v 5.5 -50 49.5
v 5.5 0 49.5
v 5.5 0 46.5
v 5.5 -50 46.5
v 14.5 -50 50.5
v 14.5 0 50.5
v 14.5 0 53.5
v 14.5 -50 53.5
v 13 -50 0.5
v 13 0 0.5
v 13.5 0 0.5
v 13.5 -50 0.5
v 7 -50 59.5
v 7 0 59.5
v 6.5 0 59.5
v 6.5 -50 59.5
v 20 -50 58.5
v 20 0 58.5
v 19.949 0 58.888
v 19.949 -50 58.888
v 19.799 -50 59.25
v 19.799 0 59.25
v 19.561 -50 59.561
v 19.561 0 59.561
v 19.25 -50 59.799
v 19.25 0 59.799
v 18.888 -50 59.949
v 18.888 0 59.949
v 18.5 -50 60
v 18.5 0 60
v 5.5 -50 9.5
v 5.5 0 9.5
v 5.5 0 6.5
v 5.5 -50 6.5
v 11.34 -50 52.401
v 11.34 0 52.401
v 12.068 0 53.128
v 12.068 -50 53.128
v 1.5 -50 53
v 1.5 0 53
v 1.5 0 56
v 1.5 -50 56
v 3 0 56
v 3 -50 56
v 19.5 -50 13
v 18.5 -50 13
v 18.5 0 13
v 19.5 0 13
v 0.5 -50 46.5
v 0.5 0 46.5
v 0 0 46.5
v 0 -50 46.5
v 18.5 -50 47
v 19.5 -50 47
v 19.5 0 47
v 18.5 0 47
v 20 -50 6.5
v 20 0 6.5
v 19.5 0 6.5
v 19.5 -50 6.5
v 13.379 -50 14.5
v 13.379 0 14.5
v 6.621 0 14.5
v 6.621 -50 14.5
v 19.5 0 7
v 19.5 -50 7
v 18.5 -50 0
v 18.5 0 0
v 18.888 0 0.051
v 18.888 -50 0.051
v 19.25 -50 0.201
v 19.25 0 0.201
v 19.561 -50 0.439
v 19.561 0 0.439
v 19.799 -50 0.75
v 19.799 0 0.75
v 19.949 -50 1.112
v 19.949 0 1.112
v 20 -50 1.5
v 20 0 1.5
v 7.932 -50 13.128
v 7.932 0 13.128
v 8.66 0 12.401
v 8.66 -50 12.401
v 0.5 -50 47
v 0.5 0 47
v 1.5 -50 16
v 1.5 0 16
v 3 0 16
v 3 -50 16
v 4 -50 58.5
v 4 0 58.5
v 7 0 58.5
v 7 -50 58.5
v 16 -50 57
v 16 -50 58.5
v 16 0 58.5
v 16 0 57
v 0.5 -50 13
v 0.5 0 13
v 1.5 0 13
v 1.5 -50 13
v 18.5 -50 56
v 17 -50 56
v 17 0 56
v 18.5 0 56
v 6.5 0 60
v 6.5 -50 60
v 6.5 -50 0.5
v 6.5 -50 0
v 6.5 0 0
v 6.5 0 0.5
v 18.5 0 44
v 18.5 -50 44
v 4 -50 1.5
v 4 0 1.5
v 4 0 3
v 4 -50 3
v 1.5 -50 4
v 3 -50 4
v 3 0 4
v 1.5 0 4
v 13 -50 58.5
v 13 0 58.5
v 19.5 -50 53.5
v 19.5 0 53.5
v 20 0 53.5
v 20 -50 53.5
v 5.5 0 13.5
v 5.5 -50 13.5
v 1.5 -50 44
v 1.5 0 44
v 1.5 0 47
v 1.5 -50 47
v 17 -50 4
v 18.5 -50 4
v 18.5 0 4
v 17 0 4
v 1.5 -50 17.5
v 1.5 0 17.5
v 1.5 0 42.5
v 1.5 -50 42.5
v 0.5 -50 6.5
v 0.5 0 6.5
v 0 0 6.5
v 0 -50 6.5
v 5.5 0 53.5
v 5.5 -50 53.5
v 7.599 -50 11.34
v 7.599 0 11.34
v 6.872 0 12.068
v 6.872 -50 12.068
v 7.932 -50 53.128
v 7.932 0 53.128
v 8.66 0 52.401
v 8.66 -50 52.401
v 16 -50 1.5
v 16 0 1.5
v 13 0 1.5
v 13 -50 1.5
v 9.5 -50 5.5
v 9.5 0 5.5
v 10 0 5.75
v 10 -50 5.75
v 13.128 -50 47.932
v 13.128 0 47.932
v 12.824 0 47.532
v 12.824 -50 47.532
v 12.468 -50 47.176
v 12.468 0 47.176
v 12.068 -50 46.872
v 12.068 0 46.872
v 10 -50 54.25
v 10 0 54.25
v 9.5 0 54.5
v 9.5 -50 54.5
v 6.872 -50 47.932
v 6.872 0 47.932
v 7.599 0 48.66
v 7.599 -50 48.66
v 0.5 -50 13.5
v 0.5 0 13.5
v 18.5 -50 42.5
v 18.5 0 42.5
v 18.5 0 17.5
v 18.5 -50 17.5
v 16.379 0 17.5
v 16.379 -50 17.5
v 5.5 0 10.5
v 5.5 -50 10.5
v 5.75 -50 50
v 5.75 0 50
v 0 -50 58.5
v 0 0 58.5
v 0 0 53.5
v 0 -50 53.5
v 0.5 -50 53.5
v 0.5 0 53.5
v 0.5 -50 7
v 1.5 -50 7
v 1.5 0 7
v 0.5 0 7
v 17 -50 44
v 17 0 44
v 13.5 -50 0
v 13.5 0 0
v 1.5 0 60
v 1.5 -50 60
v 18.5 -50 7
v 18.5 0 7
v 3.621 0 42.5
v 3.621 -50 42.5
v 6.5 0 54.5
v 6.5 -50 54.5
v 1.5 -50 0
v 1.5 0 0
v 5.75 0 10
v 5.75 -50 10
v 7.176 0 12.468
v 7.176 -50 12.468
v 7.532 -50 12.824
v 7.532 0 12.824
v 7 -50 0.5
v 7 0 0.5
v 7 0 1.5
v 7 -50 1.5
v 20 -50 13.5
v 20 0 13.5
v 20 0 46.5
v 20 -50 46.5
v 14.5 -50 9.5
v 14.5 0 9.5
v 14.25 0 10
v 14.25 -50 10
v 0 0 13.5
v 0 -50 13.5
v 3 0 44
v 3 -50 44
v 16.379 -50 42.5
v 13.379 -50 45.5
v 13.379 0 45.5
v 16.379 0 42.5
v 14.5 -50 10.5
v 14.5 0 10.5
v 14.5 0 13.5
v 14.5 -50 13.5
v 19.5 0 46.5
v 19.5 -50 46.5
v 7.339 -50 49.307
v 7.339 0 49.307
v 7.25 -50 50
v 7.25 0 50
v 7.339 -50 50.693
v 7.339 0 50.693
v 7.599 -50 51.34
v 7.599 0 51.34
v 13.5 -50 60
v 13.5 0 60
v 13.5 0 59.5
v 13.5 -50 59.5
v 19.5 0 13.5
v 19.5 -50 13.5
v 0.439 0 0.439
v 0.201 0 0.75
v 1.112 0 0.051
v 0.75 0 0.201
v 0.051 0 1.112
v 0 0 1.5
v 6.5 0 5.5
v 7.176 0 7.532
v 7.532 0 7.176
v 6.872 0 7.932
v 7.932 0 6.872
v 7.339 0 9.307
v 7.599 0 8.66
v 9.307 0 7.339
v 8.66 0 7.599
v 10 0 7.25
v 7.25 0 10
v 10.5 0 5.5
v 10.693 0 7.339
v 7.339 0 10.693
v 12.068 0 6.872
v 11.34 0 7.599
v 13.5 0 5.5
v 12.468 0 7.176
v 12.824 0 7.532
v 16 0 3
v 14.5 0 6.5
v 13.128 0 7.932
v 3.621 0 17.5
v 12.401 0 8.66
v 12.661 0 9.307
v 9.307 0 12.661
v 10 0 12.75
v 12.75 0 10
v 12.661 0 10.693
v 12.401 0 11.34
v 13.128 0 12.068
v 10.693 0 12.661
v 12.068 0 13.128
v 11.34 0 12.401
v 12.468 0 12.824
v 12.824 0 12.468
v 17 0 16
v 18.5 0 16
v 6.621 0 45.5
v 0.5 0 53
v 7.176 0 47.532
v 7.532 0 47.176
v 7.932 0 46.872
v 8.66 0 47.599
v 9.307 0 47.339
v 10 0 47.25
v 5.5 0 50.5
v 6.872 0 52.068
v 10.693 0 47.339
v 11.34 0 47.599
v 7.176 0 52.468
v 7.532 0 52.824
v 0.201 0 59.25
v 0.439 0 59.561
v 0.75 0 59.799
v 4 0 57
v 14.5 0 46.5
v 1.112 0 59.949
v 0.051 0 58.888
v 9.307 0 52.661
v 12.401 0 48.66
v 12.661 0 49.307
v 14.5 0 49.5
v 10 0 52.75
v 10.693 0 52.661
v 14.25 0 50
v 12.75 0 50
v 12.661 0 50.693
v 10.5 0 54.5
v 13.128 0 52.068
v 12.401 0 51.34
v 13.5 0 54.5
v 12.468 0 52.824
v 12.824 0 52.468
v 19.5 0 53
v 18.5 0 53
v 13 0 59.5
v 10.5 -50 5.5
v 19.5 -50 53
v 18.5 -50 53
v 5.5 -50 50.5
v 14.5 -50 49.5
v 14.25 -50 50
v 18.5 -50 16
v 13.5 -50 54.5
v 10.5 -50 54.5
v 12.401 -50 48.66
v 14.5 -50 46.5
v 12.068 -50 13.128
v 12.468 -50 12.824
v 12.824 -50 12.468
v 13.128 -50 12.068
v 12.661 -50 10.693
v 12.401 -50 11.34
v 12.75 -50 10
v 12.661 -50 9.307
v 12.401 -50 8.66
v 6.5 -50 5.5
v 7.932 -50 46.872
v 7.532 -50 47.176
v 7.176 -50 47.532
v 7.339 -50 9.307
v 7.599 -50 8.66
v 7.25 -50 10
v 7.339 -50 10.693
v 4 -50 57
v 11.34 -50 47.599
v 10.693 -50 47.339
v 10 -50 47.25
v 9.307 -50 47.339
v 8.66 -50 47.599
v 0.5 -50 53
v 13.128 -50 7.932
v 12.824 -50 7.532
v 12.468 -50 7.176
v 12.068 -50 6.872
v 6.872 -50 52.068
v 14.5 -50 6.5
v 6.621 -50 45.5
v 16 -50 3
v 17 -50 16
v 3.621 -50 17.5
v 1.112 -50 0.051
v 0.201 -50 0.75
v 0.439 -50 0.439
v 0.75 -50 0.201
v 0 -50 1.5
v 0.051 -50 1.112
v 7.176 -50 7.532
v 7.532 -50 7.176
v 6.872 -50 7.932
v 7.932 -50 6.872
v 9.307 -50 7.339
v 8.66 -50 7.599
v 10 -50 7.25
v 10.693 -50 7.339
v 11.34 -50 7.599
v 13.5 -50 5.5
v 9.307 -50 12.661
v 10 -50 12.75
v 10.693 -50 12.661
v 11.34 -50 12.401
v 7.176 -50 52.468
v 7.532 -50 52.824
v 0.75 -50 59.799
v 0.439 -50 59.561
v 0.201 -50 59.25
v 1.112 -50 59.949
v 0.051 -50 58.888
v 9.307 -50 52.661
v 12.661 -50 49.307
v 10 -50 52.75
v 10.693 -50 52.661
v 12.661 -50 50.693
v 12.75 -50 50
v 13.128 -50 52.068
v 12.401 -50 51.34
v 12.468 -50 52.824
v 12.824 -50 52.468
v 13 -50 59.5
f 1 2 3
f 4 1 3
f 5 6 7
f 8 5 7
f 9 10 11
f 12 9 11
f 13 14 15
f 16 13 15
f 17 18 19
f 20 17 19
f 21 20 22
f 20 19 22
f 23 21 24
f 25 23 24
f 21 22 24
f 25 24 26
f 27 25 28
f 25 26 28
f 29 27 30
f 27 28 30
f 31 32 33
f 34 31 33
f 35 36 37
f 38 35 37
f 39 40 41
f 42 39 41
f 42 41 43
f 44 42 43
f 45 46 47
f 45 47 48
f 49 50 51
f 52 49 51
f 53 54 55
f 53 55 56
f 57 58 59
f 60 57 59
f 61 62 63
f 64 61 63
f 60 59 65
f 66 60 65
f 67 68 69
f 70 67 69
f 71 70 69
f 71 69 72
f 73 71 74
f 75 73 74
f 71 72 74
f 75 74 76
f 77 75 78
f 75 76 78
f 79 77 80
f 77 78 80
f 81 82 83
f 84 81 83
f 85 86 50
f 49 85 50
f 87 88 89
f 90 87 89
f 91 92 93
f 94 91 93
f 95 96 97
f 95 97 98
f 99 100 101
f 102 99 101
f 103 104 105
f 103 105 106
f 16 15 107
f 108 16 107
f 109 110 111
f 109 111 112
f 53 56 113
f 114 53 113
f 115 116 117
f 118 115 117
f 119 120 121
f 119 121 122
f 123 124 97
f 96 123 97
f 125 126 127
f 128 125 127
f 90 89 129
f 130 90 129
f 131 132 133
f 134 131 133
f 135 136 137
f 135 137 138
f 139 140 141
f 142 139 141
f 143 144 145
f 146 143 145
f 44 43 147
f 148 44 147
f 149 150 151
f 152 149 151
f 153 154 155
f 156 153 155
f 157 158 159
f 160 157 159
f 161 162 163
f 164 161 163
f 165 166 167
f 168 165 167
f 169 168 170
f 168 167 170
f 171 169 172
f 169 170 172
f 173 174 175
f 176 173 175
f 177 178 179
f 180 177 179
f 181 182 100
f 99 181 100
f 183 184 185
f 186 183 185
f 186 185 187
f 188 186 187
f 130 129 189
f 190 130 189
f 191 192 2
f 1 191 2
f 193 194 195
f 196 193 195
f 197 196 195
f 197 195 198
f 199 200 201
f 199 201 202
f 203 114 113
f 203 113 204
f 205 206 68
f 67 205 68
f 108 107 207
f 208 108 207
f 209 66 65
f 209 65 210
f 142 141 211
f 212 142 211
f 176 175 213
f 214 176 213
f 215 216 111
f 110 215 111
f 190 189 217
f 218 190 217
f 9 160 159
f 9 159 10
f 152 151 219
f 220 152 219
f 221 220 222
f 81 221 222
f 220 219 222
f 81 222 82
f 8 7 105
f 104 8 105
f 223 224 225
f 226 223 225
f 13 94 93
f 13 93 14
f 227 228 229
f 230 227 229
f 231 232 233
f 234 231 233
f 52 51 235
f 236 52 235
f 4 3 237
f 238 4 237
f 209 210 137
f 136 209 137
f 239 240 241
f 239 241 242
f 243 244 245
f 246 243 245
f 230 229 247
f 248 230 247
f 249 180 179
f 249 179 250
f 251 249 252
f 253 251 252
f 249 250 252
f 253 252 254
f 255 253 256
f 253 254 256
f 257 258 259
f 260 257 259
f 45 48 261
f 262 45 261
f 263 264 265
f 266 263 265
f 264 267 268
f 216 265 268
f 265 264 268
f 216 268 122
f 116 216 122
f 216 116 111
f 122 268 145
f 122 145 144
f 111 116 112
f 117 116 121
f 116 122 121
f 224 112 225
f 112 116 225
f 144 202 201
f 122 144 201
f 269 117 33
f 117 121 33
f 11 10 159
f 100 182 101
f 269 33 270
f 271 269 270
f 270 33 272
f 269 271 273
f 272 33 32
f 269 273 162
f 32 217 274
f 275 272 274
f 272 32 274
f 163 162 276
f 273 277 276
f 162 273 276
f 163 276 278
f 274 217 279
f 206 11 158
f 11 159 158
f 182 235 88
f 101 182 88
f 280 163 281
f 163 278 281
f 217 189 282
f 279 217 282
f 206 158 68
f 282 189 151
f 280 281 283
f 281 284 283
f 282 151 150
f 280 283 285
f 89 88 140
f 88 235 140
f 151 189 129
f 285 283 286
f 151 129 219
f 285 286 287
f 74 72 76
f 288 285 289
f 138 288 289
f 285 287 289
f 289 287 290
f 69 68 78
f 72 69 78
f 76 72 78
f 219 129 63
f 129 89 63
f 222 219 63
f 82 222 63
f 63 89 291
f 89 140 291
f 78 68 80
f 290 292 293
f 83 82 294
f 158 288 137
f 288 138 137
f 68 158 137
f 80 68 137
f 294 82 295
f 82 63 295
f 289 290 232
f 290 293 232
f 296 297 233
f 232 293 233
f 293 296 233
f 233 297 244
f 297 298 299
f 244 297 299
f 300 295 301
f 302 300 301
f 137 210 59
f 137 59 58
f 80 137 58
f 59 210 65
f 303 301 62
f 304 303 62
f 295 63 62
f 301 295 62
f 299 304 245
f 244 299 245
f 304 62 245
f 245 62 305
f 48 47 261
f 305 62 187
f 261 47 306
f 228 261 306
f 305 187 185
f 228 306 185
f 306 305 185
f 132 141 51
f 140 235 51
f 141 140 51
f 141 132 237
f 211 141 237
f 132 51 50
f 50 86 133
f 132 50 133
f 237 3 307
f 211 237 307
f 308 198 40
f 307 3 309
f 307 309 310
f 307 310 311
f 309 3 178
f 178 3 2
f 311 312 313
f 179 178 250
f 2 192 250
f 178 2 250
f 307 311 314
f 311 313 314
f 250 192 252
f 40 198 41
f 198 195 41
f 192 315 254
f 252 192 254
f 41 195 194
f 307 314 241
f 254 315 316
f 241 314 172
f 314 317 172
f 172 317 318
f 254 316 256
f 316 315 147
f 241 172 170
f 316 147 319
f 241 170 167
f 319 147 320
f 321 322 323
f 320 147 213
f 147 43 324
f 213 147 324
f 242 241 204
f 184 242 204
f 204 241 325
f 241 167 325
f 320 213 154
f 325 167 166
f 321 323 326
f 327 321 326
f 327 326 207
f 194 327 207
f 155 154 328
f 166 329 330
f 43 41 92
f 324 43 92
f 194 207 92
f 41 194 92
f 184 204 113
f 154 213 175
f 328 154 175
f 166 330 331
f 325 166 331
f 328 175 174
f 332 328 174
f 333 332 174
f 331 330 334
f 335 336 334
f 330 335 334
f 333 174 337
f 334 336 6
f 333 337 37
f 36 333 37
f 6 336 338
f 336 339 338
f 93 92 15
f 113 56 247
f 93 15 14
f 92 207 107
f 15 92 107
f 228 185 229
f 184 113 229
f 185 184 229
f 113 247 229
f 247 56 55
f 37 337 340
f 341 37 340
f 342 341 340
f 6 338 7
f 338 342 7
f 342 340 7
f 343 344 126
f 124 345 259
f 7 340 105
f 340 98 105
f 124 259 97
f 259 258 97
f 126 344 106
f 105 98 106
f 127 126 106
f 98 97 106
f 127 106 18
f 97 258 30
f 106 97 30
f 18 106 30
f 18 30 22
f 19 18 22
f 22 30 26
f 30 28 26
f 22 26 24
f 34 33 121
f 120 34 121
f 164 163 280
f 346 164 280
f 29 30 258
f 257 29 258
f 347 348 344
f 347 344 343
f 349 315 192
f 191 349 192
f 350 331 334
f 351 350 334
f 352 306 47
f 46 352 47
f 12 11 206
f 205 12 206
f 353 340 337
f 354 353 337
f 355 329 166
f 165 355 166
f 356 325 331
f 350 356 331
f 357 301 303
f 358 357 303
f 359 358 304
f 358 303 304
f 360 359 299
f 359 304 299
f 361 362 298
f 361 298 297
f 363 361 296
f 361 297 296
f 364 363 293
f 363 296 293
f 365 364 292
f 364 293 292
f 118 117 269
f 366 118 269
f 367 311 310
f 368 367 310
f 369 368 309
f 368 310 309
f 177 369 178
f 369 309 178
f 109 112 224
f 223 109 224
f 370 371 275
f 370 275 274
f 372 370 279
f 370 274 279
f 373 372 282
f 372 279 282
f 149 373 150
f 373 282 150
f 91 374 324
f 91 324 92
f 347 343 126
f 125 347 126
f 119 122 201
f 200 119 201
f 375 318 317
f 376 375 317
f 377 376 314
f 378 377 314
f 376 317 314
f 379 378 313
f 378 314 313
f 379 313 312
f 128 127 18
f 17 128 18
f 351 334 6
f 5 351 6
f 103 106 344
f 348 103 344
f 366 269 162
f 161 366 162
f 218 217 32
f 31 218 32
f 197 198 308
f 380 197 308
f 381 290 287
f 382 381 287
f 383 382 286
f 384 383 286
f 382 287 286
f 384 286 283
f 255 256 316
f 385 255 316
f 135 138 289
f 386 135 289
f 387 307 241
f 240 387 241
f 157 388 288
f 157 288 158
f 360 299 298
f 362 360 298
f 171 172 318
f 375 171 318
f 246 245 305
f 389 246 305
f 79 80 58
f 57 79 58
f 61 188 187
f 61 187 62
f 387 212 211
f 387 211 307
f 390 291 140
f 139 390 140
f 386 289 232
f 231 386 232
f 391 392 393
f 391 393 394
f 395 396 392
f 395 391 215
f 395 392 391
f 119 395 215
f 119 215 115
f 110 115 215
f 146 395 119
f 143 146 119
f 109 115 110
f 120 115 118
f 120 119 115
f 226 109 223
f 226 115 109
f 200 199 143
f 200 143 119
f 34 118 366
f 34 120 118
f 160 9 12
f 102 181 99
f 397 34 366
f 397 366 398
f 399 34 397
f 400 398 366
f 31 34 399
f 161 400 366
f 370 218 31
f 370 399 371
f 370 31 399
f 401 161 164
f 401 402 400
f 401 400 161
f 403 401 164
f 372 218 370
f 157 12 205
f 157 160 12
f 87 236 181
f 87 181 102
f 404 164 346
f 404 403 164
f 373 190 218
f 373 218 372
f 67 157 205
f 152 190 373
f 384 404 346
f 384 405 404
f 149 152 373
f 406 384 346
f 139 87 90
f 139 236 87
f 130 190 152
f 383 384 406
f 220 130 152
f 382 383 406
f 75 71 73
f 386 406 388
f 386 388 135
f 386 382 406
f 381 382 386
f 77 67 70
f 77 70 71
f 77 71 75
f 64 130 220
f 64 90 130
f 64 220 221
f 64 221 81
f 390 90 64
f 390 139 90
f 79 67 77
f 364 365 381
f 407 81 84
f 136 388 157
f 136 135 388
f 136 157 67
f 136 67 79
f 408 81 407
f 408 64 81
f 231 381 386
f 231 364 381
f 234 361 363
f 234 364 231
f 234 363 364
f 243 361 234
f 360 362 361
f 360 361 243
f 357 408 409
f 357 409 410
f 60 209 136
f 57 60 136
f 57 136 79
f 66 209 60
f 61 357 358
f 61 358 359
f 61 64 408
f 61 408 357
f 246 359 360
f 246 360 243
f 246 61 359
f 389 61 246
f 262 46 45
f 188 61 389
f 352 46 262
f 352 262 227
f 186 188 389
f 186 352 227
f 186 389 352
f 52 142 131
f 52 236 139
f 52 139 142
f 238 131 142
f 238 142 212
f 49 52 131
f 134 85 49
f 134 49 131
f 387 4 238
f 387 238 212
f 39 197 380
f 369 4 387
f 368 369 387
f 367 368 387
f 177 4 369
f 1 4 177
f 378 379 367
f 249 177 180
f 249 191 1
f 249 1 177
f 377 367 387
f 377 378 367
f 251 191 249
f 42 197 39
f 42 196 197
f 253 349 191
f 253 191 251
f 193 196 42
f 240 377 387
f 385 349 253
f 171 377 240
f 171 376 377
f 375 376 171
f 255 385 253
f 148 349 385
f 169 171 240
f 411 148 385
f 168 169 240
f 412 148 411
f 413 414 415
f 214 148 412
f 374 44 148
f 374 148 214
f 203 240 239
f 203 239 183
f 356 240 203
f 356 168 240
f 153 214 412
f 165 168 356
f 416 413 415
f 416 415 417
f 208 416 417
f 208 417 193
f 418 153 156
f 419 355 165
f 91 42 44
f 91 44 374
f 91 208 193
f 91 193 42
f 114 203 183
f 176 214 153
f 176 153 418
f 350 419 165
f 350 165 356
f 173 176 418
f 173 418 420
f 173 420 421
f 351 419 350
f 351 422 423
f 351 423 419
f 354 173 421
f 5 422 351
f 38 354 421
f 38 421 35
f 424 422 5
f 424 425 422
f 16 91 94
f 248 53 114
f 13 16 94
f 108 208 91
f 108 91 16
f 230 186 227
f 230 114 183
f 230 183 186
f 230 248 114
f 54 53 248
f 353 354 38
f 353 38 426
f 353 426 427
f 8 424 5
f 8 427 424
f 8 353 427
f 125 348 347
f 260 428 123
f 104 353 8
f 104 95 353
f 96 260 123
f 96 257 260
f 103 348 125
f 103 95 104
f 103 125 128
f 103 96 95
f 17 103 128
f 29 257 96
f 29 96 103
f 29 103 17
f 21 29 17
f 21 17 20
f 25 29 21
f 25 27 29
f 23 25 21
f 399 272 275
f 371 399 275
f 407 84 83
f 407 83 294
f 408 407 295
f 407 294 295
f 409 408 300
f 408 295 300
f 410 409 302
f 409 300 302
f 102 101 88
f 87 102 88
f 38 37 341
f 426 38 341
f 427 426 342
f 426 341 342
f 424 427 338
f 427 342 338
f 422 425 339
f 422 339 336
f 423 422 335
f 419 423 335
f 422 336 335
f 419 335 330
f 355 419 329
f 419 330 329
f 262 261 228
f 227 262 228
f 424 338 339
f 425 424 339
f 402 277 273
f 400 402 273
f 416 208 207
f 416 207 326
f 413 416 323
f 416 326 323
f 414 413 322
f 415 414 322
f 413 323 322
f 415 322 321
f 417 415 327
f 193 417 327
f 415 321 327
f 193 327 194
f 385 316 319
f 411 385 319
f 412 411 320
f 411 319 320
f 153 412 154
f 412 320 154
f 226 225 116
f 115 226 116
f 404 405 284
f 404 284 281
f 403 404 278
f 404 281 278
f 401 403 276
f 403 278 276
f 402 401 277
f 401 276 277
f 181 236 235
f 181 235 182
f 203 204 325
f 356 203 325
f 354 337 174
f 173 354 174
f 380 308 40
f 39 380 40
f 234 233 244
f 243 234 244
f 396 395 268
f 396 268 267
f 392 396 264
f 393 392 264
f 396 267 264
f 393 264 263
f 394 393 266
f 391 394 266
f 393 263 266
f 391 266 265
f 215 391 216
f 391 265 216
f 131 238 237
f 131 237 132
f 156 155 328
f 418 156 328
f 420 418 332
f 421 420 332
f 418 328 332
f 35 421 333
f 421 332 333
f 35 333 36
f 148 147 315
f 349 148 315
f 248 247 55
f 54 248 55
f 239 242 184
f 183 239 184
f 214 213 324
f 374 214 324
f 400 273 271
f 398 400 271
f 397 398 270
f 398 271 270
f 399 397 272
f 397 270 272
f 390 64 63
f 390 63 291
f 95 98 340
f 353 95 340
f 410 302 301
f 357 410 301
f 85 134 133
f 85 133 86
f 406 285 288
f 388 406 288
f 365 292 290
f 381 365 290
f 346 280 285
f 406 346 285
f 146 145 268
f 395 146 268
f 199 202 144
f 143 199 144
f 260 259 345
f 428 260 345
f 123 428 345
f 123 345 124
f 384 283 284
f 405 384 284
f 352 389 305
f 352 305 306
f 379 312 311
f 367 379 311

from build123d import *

# Parameters (mm, degrees)
F1_DEPTH = 50


with BuildPart() as f1:
    # F0 (on Front) → F1 (new body)
    with BuildSketch(Plane.XZ):
        with BuildLine():
            ThreePointArc((0, 1.5), (0.43934, 0.43934), (1.5, 0))
            Line((1.5, 0), (6.5, 0))
            Line((6.5, 0), (6.5, 0.5))
            Line((6.5, 0.5), (7, 0.5))
            Line((7, 0.5), (7, 1.5))
            Line((7, 1.5), (4, 1.5))
            Line((4, 1.5), (4, 3))
            Line((4, 3), (6.5, 5.5))
            Line((6.5, 5.5), (9.5, 5.5))
            Line((9.5, 5.5), (10, 5.75))
            Line((10, 5.75), (10.5, 5.5))
            Line((10.5, 5.5), (13.5, 5.5))
            Line((13.5, 5.5), (16, 3))
            Line((16, 3), (16, 1.5))
            Line((16, 1.5), (13, 1.5))
            Line((13, 1.5), (13, 0.5))
            Line((13, 0.5), (13.5, 0.5))
            Line((13.5, 0.5), (13.5, 0))
            Line((13.5, 0), (18.5, 0))
            ThreePointArc((18.5, 0), (19.56066, 0.43934), (20, 1.5))
            Line((20, 1.5), (20, 6.5))
            Line((20, 6.5), (19.5, 6.5))
            Line((19.5, 6.5), (19.5, 7))
            Line((19.5, 7), (18.5, 7))
            Line((18.5, 7), (18.5, 4))
            Line((18.5, 4), (17, 4))
            Line((17, 4), (14.5, 6.5))
            Line((14.5, 6.5), (14.5, 9.5))
            Line((14.5, 9.5), (14.25, 10))
            Line((14.25, 10), (14.5, 10.5))
            Line((14.5, 10.5), (14.5, 13.5))
            Line((14.5, 13.5), (17, 16))
            Line((17, 16), (18.5, 16))
            Line((18.5, 16), (18.5, 13))
            Line((18.5, 13), (19.5, 13))
            Line((19.5, 13), (19.5, 13.5))
            Line((19.5, 13.5), (20, 13.5))
            Line((20, 13.5), (20, 46.5))
            Line((20, 46.5), (19.5, 46.5))
            Line((19.5, 46.5), (19.5, 47))
            Line((19.5, 47), (18.5, 47))
            Line((18.5, 47), (18.5, 44))
            Line((18.5, 44), (17, 44))
            Line((17, 44), (14.5, 46.5))
            Line((14.5, 46.5), (14.5, 49.5))
            Line((14.5, 49.5), (14.25, 50))
            Line((14.25, 50), (14.5, 50.5))
            Line((14.5, 50.5), (14.5, 53.5))
            Line((14.5, 53.5), (17, 56))
            Line((17, 56), (18.5, 56))
            Line((18.5, 56), (18.5, 53))
            Line((18.5, 53), (19.5, 53))
            Line((19.5, 53), (19.5, 53.5))
            Line((19.5, 53.5), (20, 53.5))
            Line((20, 53.5), (20, 58.5))
            ThreePointArc((20, 58.5), (19.56066, 59.56066), (18.5, 60))
            Line((18.5, 60), (13.5, 60))
            Line((13.5, 60), (13.5, 59.5))
            Line((13.5, 59.5), (13, 59.5))
            Line((13, 59.5), (13, 58.5))
            Line((13, 58.5), (16, 58.5))
            Line((16, 58.5), (16, 57))
            Line((16, 57), (13.5, 54.5))
            Line((13.5, 54.5), (10.5, 54.5))
            Line((10.5, 54.5), (10, 54.25))
            Line((10, 54.25), (9.5, 54.5))
            Line((9.5, 54.5), (6.5, 54.5))
            Line((6.5, 54.5), (4, 57))
            Line((4, 57), (4, 58.5))
            Line((4, 58.5), (7, 58.5))
            Line((7, 58.5), (7, 59.5))
            Line((7, 59.5), (6.5, 59.5))
            Line((6.5, 59.5), (6.5, 60))
            Line((6.5, 60), (1.5, 60))
            ThreePointArc((1.5, 60), (0.43934, 59.56066), (0, 58.5))
            Line((0, 58.5), (0, 53.5))
            Line((0, 53.5), (0.5, 53.5))
            Line((0.5, 53.5), (0.5, 53))
            Line((0.5, 53), (1.5, 53))
            Line((1.5, 53), (1.5, 56))
            Line((1.5, 56), (3, 56))
            Line((3, 56), (5.5, 53.5))
            Line((5.5, 53.5), (5.5, 50.5))
            Line((5.5, 50.5), (5.75, 50))
            Line((5.75, 50), (5.5, 49.5))
            Line((5.5, 49.5), (5.5, 46.5))
            Line((5.5, 46.5), (3, 44))
            Line((3, 44), (1.5, 44))
            Line((1.5, 44), (1.5, 47))
            Line((1.5, 47), (0.5, 47))
            Line((0.5, 47), (0.5, 46.5))
            Line((0.5, 46.5), (0, 46.5))
            Line((0, 46.5), (0, 13.5))
            Line((0, 13.5), (0.5, 13.5))
            Line((0.5, 13.5), (0.5, 13))
            Line((0.5, 13), (1.5, 13))
            Line((1.5, 13), (1.5, 16))
            Line((1.5, 16), (3, 16))
            Line((3, 16), (5.5, 13.5))
            Line((5.5, 13.5), (5.5, 10.5))
            Line((5.5, 10.5), (5.75, 10))
            Line((5.75, 10), (5.5, 9.5))
            Line((5.5, 9.5), (5.5, 6.5))
            Line((5.5, 6.5), (3, 4))
            Line((3, 4), (1.5, 4))
            Line((1.5, 4), (1.5, 7))
            Line((1.5, 7), (0.5, 7))
            Line((0.5, 7), (0.5, 6.5))
            Line((0.5, 6.5), (0, 6.5))
            Line((0, 6.5), (0, 1.5))
        make_face()
        with BuildLine():
            Line((8.659501, 7.598841), (7.932254, 6.871594))
            ThreePointArc((7.932254, 6.871594), (7.34835, 7.34835), (6.871594, 7.932254))
            Line((6.871594, 7.932254), (7.598841, 8.659501))
            ThreePointArc((7.598841, 8.659501), (7.25, 10), (7.598841, 11.340499))
            Line((7.598841, 11.340499), (6.871594, 12.067746))
            ThreePointArc((6.871594, 12.067746), (7.34835, 12.65165), (7.932254, 13.128406))
            Line((7.932254, 13.128406), (8.659501, 12.401159))
            ThreePointArc((8.659501, 12.401159), (10, 12.75), (11.340499, 12.401159))
            Line((11.340499, 12.401159), (12.067746, 13.128406))
            ThreePointArc((12.067746, 13.128406), (12.65165, 12.65165), (13.128406, 12.067746))
            Line((13.128406, 12.067746), (12.401159, 11.340499))
            ThreePointArc((12.401159, 11.340499), (12.75, 10), (12.401159, 8.659501))
            Line((12.401159, 8.659501), (13.128406, 7.932254))
            ThreePointArc((13.128406, 7.932254), (12.65165, 7.34835), (12.067746, 6.871594))
            Line((12.067746, 6.871594), (11.340499, 7.598841))
            ThreePointArc((11.340499, 7.598841), (10, 7.25), (8.659501, 7.598841))
        make_face(mode=Mode.SUBTRACT)
        Polygon((1.5, 42.5), (3.62132, 42.5), (6.62132, 45.5), (10, 45.5), (13.37868, 45.5), (16.37868, 42.5), (18.5, 42.5), (18.5, 30), (18.5, 17.5), (16.37868, 17.5), (13.37868, 14.5), (10, 14.5), (6.62132, 14.5), (3.62132, 17.5), (1.5, 17.5), (1.5, 30), align=None, mode=Mode.SUBTRACT)
        with BuildLine():
            ThreePointArc((8.659501, 52.401159), (10, 52.75), (11.340499, 52.401159))
            Line((11.340499, 52.401159), (12.067746, 53.128406))
            ThreePointArc((12.067746, 53.128406), (12.65165, 52.65165), (13.128406, 52.067746))
            Line((13.128406, 52.067746), (12.401159, 51.340499))
            ThreePointArc((12.401159, 51.340499), (12.75, 50), (12.401159, 48.659501))
            Line((12.401159, 48.659501), (13.128406, 47.932254))
            ThreePointArc((13.128406, 47.932254), (12.65165, 47.34835), (12.067746, 46.871594))
            Line((12.067746, 46.871594), (11.340499, 47.598841))
            ThreePointArc((11.340499, 47.598841), (10, 47.25), (8.659501, 47.598841))
            Line((8.659501, 47.598841), (7.932254, 46.871594))
            ThreePointArc((7.932254, 46.871594), (7.34835, 47.34835), (6.871594, 47.932254))
            Line((6.871594, 47.932254), (7.598841, 48.659501))
            ThreePointArc((7.598841, 48.659501), (7.25, 50), (7.598841, 51.340499))
            Line((7.598841, 51.340499), (6.871594, 52.067746))
            ThreePointArc((6.871594, 52.067746), (7.34835, 52.65165), (7.932254, 53.128406))
            Line((7.932254, 53.128406), (8.659501, 52.401159))
        make_face(mode=Mode.SUBTRACT)
    extrude(amount=F1_DEPTH)


solid = f1.part
